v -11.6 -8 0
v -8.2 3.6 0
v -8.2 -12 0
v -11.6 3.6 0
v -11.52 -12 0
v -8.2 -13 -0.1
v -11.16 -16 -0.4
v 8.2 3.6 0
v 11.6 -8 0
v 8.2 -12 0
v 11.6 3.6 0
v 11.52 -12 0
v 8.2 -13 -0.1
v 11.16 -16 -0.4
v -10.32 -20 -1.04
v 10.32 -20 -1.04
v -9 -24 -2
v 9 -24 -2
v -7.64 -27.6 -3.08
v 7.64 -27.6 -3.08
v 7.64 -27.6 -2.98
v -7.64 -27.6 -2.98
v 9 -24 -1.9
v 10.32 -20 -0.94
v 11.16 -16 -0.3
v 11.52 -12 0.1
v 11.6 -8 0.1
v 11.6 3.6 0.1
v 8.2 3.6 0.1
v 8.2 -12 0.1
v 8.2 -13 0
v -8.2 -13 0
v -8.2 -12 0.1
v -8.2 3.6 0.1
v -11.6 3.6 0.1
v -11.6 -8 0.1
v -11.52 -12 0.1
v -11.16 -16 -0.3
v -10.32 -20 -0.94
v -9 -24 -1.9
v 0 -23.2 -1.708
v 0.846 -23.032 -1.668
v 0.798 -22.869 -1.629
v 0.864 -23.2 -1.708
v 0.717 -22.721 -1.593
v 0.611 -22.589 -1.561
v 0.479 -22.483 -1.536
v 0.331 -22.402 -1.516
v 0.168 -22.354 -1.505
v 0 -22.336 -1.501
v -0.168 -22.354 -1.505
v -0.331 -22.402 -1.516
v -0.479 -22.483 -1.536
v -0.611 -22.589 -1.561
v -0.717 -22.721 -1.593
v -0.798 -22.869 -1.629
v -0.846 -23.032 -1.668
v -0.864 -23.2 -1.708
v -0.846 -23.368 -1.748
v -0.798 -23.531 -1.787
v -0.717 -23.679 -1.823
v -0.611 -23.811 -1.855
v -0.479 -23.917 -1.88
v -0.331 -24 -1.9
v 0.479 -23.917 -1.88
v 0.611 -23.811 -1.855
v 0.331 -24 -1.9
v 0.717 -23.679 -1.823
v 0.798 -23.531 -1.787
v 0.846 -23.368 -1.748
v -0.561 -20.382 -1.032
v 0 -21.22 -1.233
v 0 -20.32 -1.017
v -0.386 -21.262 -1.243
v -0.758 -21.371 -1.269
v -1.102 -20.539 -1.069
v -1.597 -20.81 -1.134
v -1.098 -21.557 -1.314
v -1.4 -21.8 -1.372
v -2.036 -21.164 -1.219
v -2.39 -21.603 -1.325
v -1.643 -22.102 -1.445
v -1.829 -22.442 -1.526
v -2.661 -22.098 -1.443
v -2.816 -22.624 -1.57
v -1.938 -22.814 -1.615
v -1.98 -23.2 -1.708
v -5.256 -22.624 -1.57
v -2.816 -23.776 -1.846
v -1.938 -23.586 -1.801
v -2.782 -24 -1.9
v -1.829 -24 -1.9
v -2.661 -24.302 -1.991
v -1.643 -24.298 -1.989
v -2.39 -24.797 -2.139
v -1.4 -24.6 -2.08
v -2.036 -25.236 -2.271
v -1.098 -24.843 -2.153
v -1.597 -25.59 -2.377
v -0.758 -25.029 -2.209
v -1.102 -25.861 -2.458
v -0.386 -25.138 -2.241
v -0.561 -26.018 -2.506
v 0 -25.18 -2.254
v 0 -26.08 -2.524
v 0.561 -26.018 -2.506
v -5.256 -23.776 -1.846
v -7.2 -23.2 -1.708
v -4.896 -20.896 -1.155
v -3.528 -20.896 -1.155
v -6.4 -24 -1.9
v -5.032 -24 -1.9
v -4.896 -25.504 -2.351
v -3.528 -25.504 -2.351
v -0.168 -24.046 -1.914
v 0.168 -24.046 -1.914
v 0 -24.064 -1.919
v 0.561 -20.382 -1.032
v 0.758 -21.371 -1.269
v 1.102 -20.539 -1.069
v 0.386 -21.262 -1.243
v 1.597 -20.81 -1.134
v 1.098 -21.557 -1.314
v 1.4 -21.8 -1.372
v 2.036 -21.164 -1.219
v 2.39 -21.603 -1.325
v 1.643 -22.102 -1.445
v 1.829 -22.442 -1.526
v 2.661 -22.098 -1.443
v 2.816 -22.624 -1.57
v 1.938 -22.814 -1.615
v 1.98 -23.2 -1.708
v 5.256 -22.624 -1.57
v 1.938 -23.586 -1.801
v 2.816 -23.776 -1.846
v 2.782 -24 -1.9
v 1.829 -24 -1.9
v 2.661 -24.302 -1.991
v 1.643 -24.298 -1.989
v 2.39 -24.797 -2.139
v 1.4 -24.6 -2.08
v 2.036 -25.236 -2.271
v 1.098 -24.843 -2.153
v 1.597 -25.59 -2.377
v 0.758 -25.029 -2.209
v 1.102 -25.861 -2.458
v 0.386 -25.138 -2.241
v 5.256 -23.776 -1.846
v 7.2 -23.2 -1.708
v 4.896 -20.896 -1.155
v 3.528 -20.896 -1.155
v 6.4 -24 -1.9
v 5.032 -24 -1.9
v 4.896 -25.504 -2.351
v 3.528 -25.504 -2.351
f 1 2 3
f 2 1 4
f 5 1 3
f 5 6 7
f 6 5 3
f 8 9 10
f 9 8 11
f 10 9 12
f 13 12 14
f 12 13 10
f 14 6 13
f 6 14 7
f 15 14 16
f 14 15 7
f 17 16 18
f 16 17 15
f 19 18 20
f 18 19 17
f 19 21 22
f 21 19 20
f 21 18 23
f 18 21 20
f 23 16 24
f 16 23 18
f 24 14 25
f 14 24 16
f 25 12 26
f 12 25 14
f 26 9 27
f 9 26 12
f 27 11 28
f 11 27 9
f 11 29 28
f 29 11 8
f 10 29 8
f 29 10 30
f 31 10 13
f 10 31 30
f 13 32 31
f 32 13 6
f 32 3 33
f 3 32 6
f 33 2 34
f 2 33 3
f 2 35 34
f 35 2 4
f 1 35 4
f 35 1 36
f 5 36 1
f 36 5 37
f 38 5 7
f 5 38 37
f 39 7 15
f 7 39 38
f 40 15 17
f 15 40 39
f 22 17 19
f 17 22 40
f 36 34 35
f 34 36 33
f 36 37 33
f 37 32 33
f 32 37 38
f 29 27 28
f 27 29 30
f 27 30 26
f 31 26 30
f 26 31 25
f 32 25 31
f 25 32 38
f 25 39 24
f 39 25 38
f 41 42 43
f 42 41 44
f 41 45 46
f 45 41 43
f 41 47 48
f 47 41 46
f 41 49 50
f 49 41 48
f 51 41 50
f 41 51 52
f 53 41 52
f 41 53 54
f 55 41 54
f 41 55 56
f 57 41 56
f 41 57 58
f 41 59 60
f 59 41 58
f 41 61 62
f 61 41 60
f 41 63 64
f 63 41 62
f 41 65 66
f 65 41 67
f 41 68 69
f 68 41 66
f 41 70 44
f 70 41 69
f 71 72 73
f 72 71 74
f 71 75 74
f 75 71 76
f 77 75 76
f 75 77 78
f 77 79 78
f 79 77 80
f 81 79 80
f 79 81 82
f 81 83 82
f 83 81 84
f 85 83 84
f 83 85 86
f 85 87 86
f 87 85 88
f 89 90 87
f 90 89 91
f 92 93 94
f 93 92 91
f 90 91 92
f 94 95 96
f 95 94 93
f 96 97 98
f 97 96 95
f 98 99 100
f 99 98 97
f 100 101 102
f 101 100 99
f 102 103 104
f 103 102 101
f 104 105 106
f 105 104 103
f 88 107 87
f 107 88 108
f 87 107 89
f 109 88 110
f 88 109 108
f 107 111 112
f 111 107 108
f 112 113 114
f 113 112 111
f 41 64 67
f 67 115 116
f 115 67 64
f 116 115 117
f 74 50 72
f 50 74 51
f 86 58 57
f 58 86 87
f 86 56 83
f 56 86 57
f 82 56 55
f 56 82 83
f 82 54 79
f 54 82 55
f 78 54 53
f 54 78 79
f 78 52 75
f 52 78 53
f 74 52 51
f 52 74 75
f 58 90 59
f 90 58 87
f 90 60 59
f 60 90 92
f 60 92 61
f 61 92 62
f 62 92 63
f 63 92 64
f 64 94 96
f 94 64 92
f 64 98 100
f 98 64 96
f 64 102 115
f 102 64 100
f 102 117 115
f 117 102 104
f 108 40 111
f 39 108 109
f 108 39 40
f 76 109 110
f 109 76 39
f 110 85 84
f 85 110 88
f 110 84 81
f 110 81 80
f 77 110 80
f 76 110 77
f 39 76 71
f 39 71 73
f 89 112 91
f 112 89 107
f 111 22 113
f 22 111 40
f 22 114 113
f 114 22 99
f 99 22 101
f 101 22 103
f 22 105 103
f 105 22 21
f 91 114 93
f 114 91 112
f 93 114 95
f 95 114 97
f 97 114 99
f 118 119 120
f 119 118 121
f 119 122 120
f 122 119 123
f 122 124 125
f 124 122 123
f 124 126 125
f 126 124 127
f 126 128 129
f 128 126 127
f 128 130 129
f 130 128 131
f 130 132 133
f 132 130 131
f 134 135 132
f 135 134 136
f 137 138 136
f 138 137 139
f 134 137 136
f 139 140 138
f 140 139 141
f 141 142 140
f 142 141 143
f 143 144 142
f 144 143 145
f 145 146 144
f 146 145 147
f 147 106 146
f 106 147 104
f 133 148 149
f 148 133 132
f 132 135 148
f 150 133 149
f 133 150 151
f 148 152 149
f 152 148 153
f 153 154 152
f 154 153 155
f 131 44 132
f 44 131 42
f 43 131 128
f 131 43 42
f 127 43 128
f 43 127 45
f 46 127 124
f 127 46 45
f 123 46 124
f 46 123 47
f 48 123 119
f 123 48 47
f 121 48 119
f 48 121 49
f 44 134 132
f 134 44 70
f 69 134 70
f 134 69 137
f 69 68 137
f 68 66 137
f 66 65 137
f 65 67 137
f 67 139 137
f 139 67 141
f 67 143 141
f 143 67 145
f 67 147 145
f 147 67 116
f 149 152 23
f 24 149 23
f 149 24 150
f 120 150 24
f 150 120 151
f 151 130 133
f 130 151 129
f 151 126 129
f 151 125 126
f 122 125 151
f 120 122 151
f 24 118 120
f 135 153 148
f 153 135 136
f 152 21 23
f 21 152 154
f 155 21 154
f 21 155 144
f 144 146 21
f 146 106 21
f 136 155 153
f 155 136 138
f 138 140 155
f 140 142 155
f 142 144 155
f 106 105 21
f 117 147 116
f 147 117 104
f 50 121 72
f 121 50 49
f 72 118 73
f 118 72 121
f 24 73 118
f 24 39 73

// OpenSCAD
use <../lib.scad>
function ldraw_lib__4263304ec01() = [
// 0 Sticker  3.9 x  2.9 with Yellow Lego Train Logo (BNSF) on Dark Green Background (Formed)
// 0 Name: 4263304ec01.dat
// 0 Author: Gerald Lasser [GeraldLasser]
// 0 !LDRAW_ORG Part UPDATE 2025-01
// 0 !LICENSE Licensed under CC BY 4.0 : see CAreadme.txt
// 
// 0 BFC CERTIFY CCW
  [0,"BFC","CERTIFY"],
  [0,"BFC","CCW"],
// 
// 0 !KEYWORDS Bricklink 10133stk01, Brickowl 912944, Rebrickable 53049, santa fe
// 0 !KEYWORDS Set 10133
// 
// 0 !HISTORY 2025-01-20 [OrionP] Official Update 2025-01
// 
// 4 16 -29 0 9 -20.5 0 9 -20.5 0 -30 -29 0 -20
  [4,16,-29,0,9,-20.5,0,9,-20.5,0,-30,-29,0,-20],
// 3 16 -28.8 0 -30 -29 0 -20 -20.5 0 -30
  [3,16,-28.8,0,-30,-29,0,-20,-20.5,0,-30],
// 4 16 -27.9 1 -40 -28.8 0 -30 -20.5 0 -30 -20.5 .25 -32.5
  [4,16,-27.9,1,-40,-28.8,0,-30,-20.5,0,-30,-20.5,.25,-32.5],
// 4 16 20.5 0 -30 20.5 0 9 29 0 9 29 0 -20
  [4,16,20.5,0,-30,20.5,0,9,29,0,9,29,0,-20],
// 3 16 20.5 0 -30 29 0 -20 28.8 0 -30
  [3,16,20.5,0,-30,29,0,-20,28.8,0,-30],
// 4 16 20.5 0 -30 28.8 0 -30 27.9 1 -40 20.5 .25 -32.5
  [4,16,20.5,0,-30,28.8,0,-30,27.9,1,-40,20.5,.25,-32.5],
// 4 16 -27.9 1 -40 -20.5 .25 -32.5 20.5 .25 -32.5 27.9 1 -40
  [4,16,-27.9,1,-40,-20.5,.25,-32.5,20.5,.25,-32.5,27.9,1,-40],
// 4 16 -27.9 1 -40 27.9 1 -40 25.8 2.6 -50 -25.8 2.6 -50
  [4,16,-27.9,1,-40,27.9,1,-40,25.8,2.6,-50,-25.8,2.6,-50],
// 4 16 25.8 2.6 -50 22.5 5 -60 -22.5 5 -60 -25.8 2.6 -50
  [4,16,25.8,2.6,-50,22.5,5,-60,-22.5,5,-60,-25.8,2.6,-50],
// 4 16 19.1 7.7 -69 -19.1 7.7 -69 -22.5 5 -60 22.5 5 -60
  [4,16,19.1,7.7,-69,-19.1,7.7,-69,-22.5,5,-60,22.5,5,-60],
// 4 16 19.1 7.45 -69 -19.1 7.45 -69 -19.1 7.7 -69 19.1 7.7 -69
  [4,16,19.1,7.45,-69,-19.1,7.45,-69,-19.1,7.7,-69,19.1,7.7,-69],
// 4 16 22.5 4.75 -60 19.1 7.45 -69 19.1 7.7 -69 22.5 5 -60
  [4,16,22.5,4.75,-60,19.1,7.45,-69,19.1,7.7,-69,22.5,5,-60],
// 4 16 25.8 2.35 -50 22.5 4.75 -60 22.5 5 -60 25.8 2.6 -50
  [4,16,25.8,2.35,-50,22.5,4.75,-60,22.5,5,-60,25.8,2.6,-50],
// 4 16 27.9 .75 -40 25.8 2.35 -50 25.8 2.6 -50 27.9 1 -40
  [4,16,27.9,.75,-40,25.8,2.35,-50,25.8,2.6,-50,27.9,1,-40],
// 4 16 28.8 -.25 -30 27.9 .75 -40 27.9 1 -40 28.8 0 -30
  [4,16,28.8,-.25,-30,27.9,.75,-40,27.9,1,-40,28.8,0,-30],
// 4 16 29 -.25 -20 28.8 -.25 -30 28.8 0 -30 29 0 -20
  [4,16,29,-.25,-20,28.8,-.25,-30,28.8,0,-30,29,0,-20],
// 4 16 29 -.25 9 29 -.25 -20 29 0 -20 29 0 9
  [4,16,29,-.25,9,29,-.25,-20,29,0,-20,29,0,9],
// 4 16 20.5 0 9 20.5 -.25 9 29 -.25 9 29 0 9
  [4,16,20.5,0,9,20.5,-.25,9,29,-.25,9,29,0,9],
// 4 16 20.5 -.25 -30 20.5 -.25 9 20.5 0 9 20.5 0 -30
  [4,16,20.5,-.25,-30,20.5,-.25,9,20.5,0,9,20.5,0,-30],
// 4 16 20.5 0 -32.5 20.5 -.25 -30 20.5 0 -30 20.5 .25 -32.5
  [4,16,20.5,0,-32.5,20.5,-.25,-30,20.5,0,-30,20.5,.25,-32.5],
// 4 16 -20.5 0 -32.5 20.5 0 -32.5 20.5 .25 -32.5 -20.5 .25 -32.5
  [4,16,-20.5,0,-32.5,20.5,0,-32.5,20.5,.25,-32.5,-20.5,.25,-32.5],
// 4 16 -20.5 0 -30 -20.5 -.25 -30 -20.5 0 -32.5 -20.5 .25 -32.5
  [4,16,-20.5,0,-30,-20.5,-.25,-30,-20.5,0,-32.5,-20.5,.25,-32.5],
// 4 16 -20.5 -.25 9 -20.5 -.25 -30 -20.5 0 -30 -20.5 0 9
  [4,16,-20.5,-.25,9,-20.5,-.25,-30,-20.5,0,-30,-20.5,0,9],
// 4 16 -29 -.25 9 -20.5 -.25 9 -20.5 0 9 -29 0 9
  [4,16,-29,-.25,9,-20.5,-.25,9,-20.5,0,9,-29,0,9],
// 4 16 -29 -.25 -20 -29 -.25 9 -29 0 9 -29 0 -20
  [4,16,-29,-.25,-20,-29,-.25,9,-29,0,9,-29,0,-20],
// 4 16 -28.8 -.25 -30 -29 -.25 -20 -29 0 -20 -28.8 0 -30
  [4,16,-28.8,-.25,-30,-29,-.25,-20,-29,0,-20,-28.8,0,-30],
// 4 16 -27.9 .75 -40 -28.8 -.25 -30 -28.8 0 -30 -27.9 1 -40
  [4,16,-27.9,.75,-40,-28.8,-.25,-30,-28.8,0,-30,-27.9,1,-40],
// 4 16 -25.8 2.35 -50 -27.9 .75 -40 -27.9 1 -40 -25.8 2.6 -50
  [4,16,-25.8,2.35,-50,-27.9,.75,-40,-27.9,1,-40,-25.8,2.6,-50],
// 4 16 -22.5 4.75 -60 -25.8 2.35 -50 -25.8 2.6 -50 -22.5 5 -60
  [4,16,-22.5,4.75,-60,-25.8,2.35,-50,-25.8,2.6,-50,-22.5,5,-60],
// 4 16 -19.1 7.45 -69 -22.5 4.75 -60 -22.5 5 -60 -19.1 7.7 -69
  [4,16,-19.1,7.45,-69,-22.5,4.75,-60,-22.5,5,-60,-19.1,7.7,-69],
// 
// 4 288 -20.5 -.25 -30 -20.5 -.25 9 -29 -.25 9 -29 -.25 -20
  [4,288,-20.5,-.25,-30,-20.5,-.25,9,-29,-.25,9,-29,-.25,-20],
// 3 288 -29 -.25 -20 -28.8 -.25 -30 -20.5 -.25 -30
  [3,288,-29,-.25,-20,-28.8,-.25,-30,-20.5,-.25,-30],
// 4 288 -20.5 -.25 -30 -28.8 -.25 -30 -27.9 .75 -40 -20.5 0 -32.5
  [4,288,-20.5,-.25,-30,-28.8,-.25,-30,-27.9,.75,-40,-20.5,0,-32.5],
// 4 288 29 -.25 9 20.5 -.25 9 20.5 -.25 -30 29 -.25 -20
  [4,288,29,-.25,9,20.5,-.25,9,20.5,-.25,-30,29,-.25,-20],
// 3 288 29 -.25 -20 20.5 -.25 -30 28.8 -.25 -30
  [3,288,29,-.25,-20,20.5,-.25,-30,28.8,-.25,-30],
// 4 288 27.9 .75 -40 28.8 -.25 -30 20.5 -.25 -30 20.5 0 -32.5
  [4,288,27.9,.75,-40,28.8,-.25,-30,20.5,-.25,-30,20.5,0,-32.5],
// 4 288 20.5 0 -32.5 -20.5 0 -32.5 -27.9 .75 -40 27.9 .75 -40
  [4,288,20.5,0,-32.5,-20.5,0,-32.5,-27.9,.75,-40,27.9,.75,-40],
// 4 288 25.8 2.35 -50 27.9 .75 -40 -27.9 .75 -40 -25.8 2.35 -50
  [4,288,25.8,2.35,-50,27.9,.75,-40,-27.9,.75,-40,-25.8,2.35,-50],
// 4 14 0 4.27 -58 2.16 4.27 -58 2.114 4.1692 -57.58 1.99562 4.07161 -57.17337
  [4,14,0,4.27,-58,2.16,4.27,-58,2.114,4.1692,-57.58,1.99562,4.07161,-57.17337],
// 4 14 0 4.27 -58 1.99562 4.07161 -57.17337 1.792 3.98248 -56.802 1.52734 3.90344 -56.47266
  [4,14,0,4.27,-58,1.99562,4.07161,-57.17337,1.792,3.98248,-56.802,1.52734,3.90344,-56.47266],
// 4 14 0 4.27 -58 1.52734 3.90344 -56.47266 1.198 3.83992 -56.208 .82663 3.79105 -56.00438
  [4,14,0,4.27,-58,1.52734,3.90344,-56.47266,1.198,3.83992,-56.208,.82663,3.79105,-56.00438],
// 4 14 0 4.27 -58 .82663 3.79105 -56.00438 .42 3.76264 -55.886 0 3.7516 -55.84
  [4,14,0,4.27,-58,.82663,3.79105,-56.00438,.42,3.76264,-55.886,0,3.7516,-55.84],
// 4 14 0 4.27 -58 0 3.7516 -55.84 -.42 3.76264 -55.886 -.82663 3.79105 -56.00438
  [4,14,0,4.27,-58,0,3.7516,-55.84,-.42,3.76264,-55.886,-.82663,3.79105,-56.00438],
// 4 14 0 4.27 -58 -.82663 3.79105 -56.00438 -1.198 3.83992 -56.208 -1.52734 3.90344 -56.47266
  [4,14,0,4.27,-58,-.82663,3.79105,-56.00438,-1.198,3.83992,-56.208,-1.52734,3.90344,-56.47266],
// 4 14 0 4.27 -58 -1.52734 3.90344 -56.47266 -1.792 3.98248 -56.802 -1.99562 4.07161 -57.17337
  [4,14,0,4.27,-58,-1.52734,3.90344,-56.47266,-1.792,3.98248,-56.802,-1.99562,4.07161,-57.17337],
// 4 14 0 4.27 -58 -1.99562 4.07161 -57.17337 -2.114 4.1692 -57.58 -2.16 4.27 -58
  [4,14,0,4.27,-58,-1.99562,4.07161,-57.17337,-2.114,4.1692,-57.58,-2.16,4.27,-58],
// 4 14 0 4.27 -58 -2.16 4.27 -58 -2.114 4.3708 -58.42 -1.99562 4.46839 -58.82663
  [4,14,0,4.27,-58,-2.16,4.27,-58,-2.114,4.3708,-58.42,-1.99562,4.46839,-58.82663],
// 4 14 0 4.27 -58 -1.99562 4.46839 -58.82663 -1.792 4.55752 -59.198 -1.52734 4.63656 -59.52734
  [4,14,0,4.27,-58,-1.99562,4.46839,-58.82663,-1.792,4.55752,-59.198,-1.52734,4.63656,-59.52734],
// 4 14 0 4.27 -58 -1.52734 4.63656 -59.52734 -1.198 4.70008 -59.792 -.82663 4.75 -60
  [4,14,0,4.27,-58,-1.52734,4.63656,-59.52734,-1.198,4.70008,-59.792,-.82663,4.75,-60],
// 4 14 0 4.27 -58 .82663 4.75 -60 1.198 4.70008 -59.792 1.52734 4.63656 -59.52734
  [4,14,0,4.27,-58,.82663,4.75,-60,1.198,4.70008,-59.792,1.52734,4.63656,-59.52734],
// 4 14 0 4.27 -58 1.52734 4.63656 -59.52734 1.792 4.55752 -59.198 1.99562 4.46839 -58.82663
  [4,14,0,4.27,-58,1.52734,4.63656,-59.52734,1.792,4.55752,-59.198,1.99562,4.46839,-58.82663],
// 4 14 0 4.27 -58 1.99562 4.46839 -58.82663 2.114 4.3708 -58.42 2.16 4.27 -58
  [4,14,0,4.27,-58,1.99562,4.46839,-58.82663,2.114,4.3708,-58.42,2.16,4.27,-58],
// 4 14 0 2.542 -50.8 -1.402 2.57896 -50.954 -.964 3.10744 -53.156 0 3.082 -53.05
  [4,14,0,2.542,-50.8,-1.402,2.57896,-50.954,-.964,3.10744,-53.156,0,3.082,-53.05],
// 4 14 -1.402 2.57896 -50.954 -2.75544 2.6735 -51.34792 -1.89437 3.17241 -53.42669 -.964 3.10744 -53.156
  [4,14,-1.402,2.57896,-50.954,-2.75544,2.6735,-51.34792,-1.89437,3.17241,-53.42669,-.964,3.10744,-53.156],
// 4 14 -2.75544 2.6735 -51.34792 -3.992 2.83624 -52.026 -2.744 3.28432 -53.893 -1.89437 3.17241 -53.42669
  [4,14,-2.75544,2.6735,-51.34792,-3.992,2.83624,-52.026,-2.744,3.28432,-53.893,-1.89437,3.17241,-53.42669],
// 4 14 -3.992 2.83624 -52.026 -5.09112 3.04813 -52.90888 -3.50015 3.42997 -54.49985 -2.744 3.28432 -53.893
  [4,14,-3.992,2.83624,-52.026,-5.09112,3.04813,-52.90888,-3.50015,3.42997,-54.49985,-2.744,3.28432,-53.893],
// 4 14 -3.50015 3.42997 -54.49985 -5.09112 3.04813 -52.90888 -5.974 3.31192 -54.008 -4.107 3.61144 -55.256
  [4,14,-3.50015,3.42997,-54.49985,-5.09112,3.04813,-52.90888,-5.974,3.31192,-54.008,-4.107,3.61144,-55.256],
// 4 14 -5.974 3.31192 -54.008 -6.65208 3.60869 -55.24456 -4.57331 3.81535 -56.10563 -4.107 3.61144 -55.256
  [4,14,-5.974,3.31192,-54.008,-6.65208,3.60869,-55.24456,-4.57331,3.81535,-56.10563,-4.107,3.61144,-55.256],
// 4 14 -6.65208 3.60869 -55.24456 -7.03926 3.9244 -56.56 -4.844 4.03864 -57.036 -4.57331 3.81535 -56.10563
  [4,14,-6.65208,3.60869,-55.24456,-7.03926,3.9244,-56.56,-4.844,4.03864,-57.036,-4.57331,3.81535,-56.10563],
// 4 14 -4.95 4.27 -58 -4.844 4.03864 -57.036 -7.03926 3.9244 -56.56 -13.14 3.9244 -56.56
  [4,14,-4.95,4.27,-58,-4.844,4.03864,-57.036,-7.03926,3.9244,-56.56,-13.14,3.9244,-56.56],
// 4 14 -4.844 4.50136 -58.964 -4.95 4.27 -58 -7.03926 4.6156 -59.44 -6.95448 4.75 -60
  [4,14,-4.844,4.50136,-58.964,-4.95,4.27,-58,-7.03926,4.6156,-59.44,-6.95448,4.75,-60],
// 4 14 -4.57331 4.75 -60 -6.95448 4.75 -60 -6.65208 4.97663 -60.75544 -4.107 4.9732 -60.744
  [4,14,-4.57331,4.75,-60,-6.95448,4.75,-60,-6.65208,4.97663,-60.75544,-4.107,4.9732,-60.744],
// 3 14 -4.844 4.50136 -58.964 -6.95448 4.75 -60 -4.57331 4.75 -60
  [3,14,-4.844,4.50136,-58.964,-6.95448,4.75,-60,-4.57331,4.75,-60],
// 4 14 -4.107 4.9732 -60.744 -6.65208 4.97663 -60.75544 -5.974 5.3476 -61.992 -3.50014 5.20004 -61.50015
  [4,14,-4.107,4.9732,-60.744,-6.65208,4.97663,-60.75544,-5.974,5.3476,-61.992,-3.50014,5.20004,-61.50015],
// 4 14 -3.50014 5.20004 -61.50015 -5.974 5.3476 -61.992 -5.09112 5.67734 -63.09112 -2.744 5.3821 -62.107
  [4,14,-3.50014,5.20004,-61.50015,-5.974,5.3476,-61.992,-5.09112,5.67734,-63.09112,-2.744,5.3821,-62.107],
// 4 14 -2.744 5.3821 -62.107 -5.09112 5.67734 -63.09112 -3.992 5.9422 -63.974 -1.89436 5.52199 -62.57331
  [4,14,-2.744,5.3821,-62.107,-5.09112,5.67734,-63.09112,-3.992,5.9422,-63.974,-1.89436,5.52199,-62.57331],
// 4 14 -1.89436 5.52199 -62.57331 -3.992 5.9422 -63.974 -2.75544 6.14562 -64.65208 -.964 5.6032 -62.844
  [4,14,-1.89436,5.52199,-62.57331,-3.992,5.9422,-63.974,-2.75544,6.14562,-64.65208,-.964,5.6032,-62.844],
// 4 14 -.964 5.6032 -62.844 -2.75544 6.14562 -64.65208 -1.402 6.2638 -65.046 0 5.635 -62.95
  [4,14,-.964,5.6032,-62.844,-2.75544,6.14562,-64.65208,-1.402,6.2638,-65.046,0,5.635,-62.95],
// 4 14 0 5.635 -62.95 -1.402 6.2638 -65.046 0 6.31 -65.2 1.402 6.2638 -65.046
  [4,14,0,5.635,-62.95,-1.402,6.2638,-65.046,0,6.31,-65.2,1.402,6.2638,-65.046],
// 4 14 -4.95 4.27 -58 -13.14 3.9244 -56.56 -18 4.27 -58 -13.14 4.6156 -59.44
  [4,14,-4.95,4.27,-58,-13.14,3.9244,-56.56,-18,4.27,-58,-13.14,4.6156,-59.44],
// 3 14 -4.95 4.27 -58 -13.14 4.6156 -59.44 -7.03926 4.6156 -59.44
  [3,14,-4.95,4.27,-58,-13.14,4.6156,-59.44,-7.03926,4.6156,-59.44],
// 4 14 -13.14 3.9244 -56.56 -8.82 2.8876 -52.24 -12.24 2.8876 -52.24 -18 4.27 -58
  [4,14,-13.14,3.9244,-56.56,-8.82,2.8876,-52.24,-12.24,2.8876,-52.24,-18,4.27,-58],
// 4 14 -16 4.75 -60 -12.58 4.75 -60 -13.14 4.6156 -59.44 -18 4.27 -58
  [4,14,-16,4.75,-60,-12.58,4.75,-60,-13.14,4.6156,-59.44,-18,4.27,-58],
// 4 14 -16 4.75 -60 -12.24 5.878 -63.76 -8.82 5.878 -63.76 -12.58 4.75 -60
  [4,14,-16,4.75,-60,-12.24,5.878,-63.76,-8.82,5.878,-63.76,-12.58,4.75,-60],
// 3 14 0 4.27 -58 -.82663 4.75 -60 .82663 4.75 -60
  [3,14,0,4.27,-58,-.82663,4.75,-60,.82663,4.75,-60],
// 4 14 -.82663 4.75 -60 -.42 4.7842 -60.114 .42 4.7842 -60.114 .82663 4.75 -60
  [4,14,-.82663,4.75,-60,-.42,4.7842,-60.114,.42,4.7842,-60.114,.82663,4.75,-60],
// 3 14 .42 4.7842 -60.114 -.42 4.7842 -60.114 0 4.798 -60.16
  [3,14,.42,4.7842,-60.114,-.42,4.7842,-60.114,0,4.798,-60.16],
// 4 288 -.964 3.10744 -53.156 -.42 3.76264 -55.886 0 3.7516 -55.84 0 3.082 -53.05
  [4,288,-.964,3.10744,-53.156,-.42,3.76264,-55.886,0,3.7516,-55.84,0,3.082,-53.05],
// 4 288 -4.844 4.03864 -57.036 -4.95 4.27 -58 -2.16 4.27 -58 -2.114 4.1692 -57.58
  [4,288,-4.844,4.03864,-57.036,-4.95,4.27,-58,-2.16,4.27,-58,-2.114,4.1692,-57.58],
// 4 288 -4.57331 3.81535 -56.10563 -4.844 4.03864 -57.036 -2.114 4.1692 -57.58 -1.99562 4.07161 -57.17337
  [4,288,-4.57331,3.81535,-56.10563,-4.844,4.03864,-57.036,-2.114,4.1692,-57.58,-1.99562,4.07161,-57.17337],
// 4 288 -4.107 3.61144 -55.256 -4.57331 3.81535 -56.10563 -1.99562 4.07161 -57.17337 -1.792 3.98248 -56.802
  [4,288,-4.107,3.61144,-55.256,-4.57331,3.81535,-56.10563,-1.99562,4.07161,-57.17337,-1.792,3.98248,-56.802],
// 4 288 -3.50015 3.42997 -54.49985 -4.107 3.61144 -55.256 -1.792 3.98248 -56.802 -1.52734 3.90344 -56.47266
  [4,288,-3.50015,3.42997,-54.49985,-4.107,3.61144,-55.256,-1.792,3.98248,-56.802,-1.52734,3.90344,-56.47266],
// 4 288 -2.744 3.28432 -53.893 -3.50015 3.42997 -54.49985 -1.52734 3.90344 -56.47266 -1.198 3.83992 -56.208
  [4,288,-2.744,3.28432,-53.893,-3.50015,3.42997,-54.49985,-1.52734,3.90344,-56.47266,-1.198,3.83992,-56.208],
// 4 288 -1.89437 3.17241 -53.42669 -2.744 3.28432 -53.893 -1.198 3.83992 -56.208 -.82663 3.79105 -56.00438
  [4,288,-1.89437,3.17241,-53.42669,-2.744,3.28432,-53.893,-1.198,3.83992,-56.208,-.82663,3.79105,-56.00438],
// 4 288 -.964 3.10744 -53.156 -1.89437 3.17241 -53.42669 -.82663 3.79105 -56.00438 -.42 3.76264 -55.886
  [4,288,-.964,3.10744,-53.156,-1.89437,3.17241,-53.42669,-.82663,3.79105,-56.00438,-.42,3.76264,-55.886],
// 4 288 -4.95 4.27 -58 -4.844 4.50136 -58.964 -2.114 4.3708 -58.42 -2.16 4.27 -58
  [4,288,-4.95,4.27,-58,-4.844,4.50136,-58.964,-2.114,4.3708,-58.42,-2.16,4.27,-58],
// 4 288 -2.114 4.3708 -58.42 -4.844 4.50136 -58.964 -4.57331 4.75 -60 -1.99562 4.46839 -58.82663
  [4,288,-2.114,4.3708,-58.42,-4.844,4.50136,-58.964,-4.57331,4.75,-60,-1.99562,4.46839,-58.82663],
// 3 288 -1.99562 4.46839 -58.82663 -4.57331 4.75 -60 -1.792 4.55752 -59.198
  [3,288,-1.99562,4.46839,-58.82663,-4.57331,4.75,-60,-1.792,4.55752,-59.198],
// 3 288 -1.792 4.55752 -59.198 -4.57331 4.75 -60 -1.52734 4.63656 -59.52734
  [3,288,-1.792,4.55752,-59.198,-4.57331,4.75,-60,-1.52734,4.63656,-59.52734],
// 3 288 -1.52734 4.63656 -59.52734 -4.57331 4.75 -60 -1.198 4.70008 -59.792
  [3,288,-1.52734,4.63656,-59.52734,-4.57331,4.75,-60,-1.198,4.70008,-59.792],
// 3 288 -1.198 4.70008 -59.792 -4.57331 4.75 -60 -.82663 4.75 -60
  [3,288,-1.198,4.70008,-59.792,-4.57331,4.75,-60,-.82663,4.75,-60],
// 4 288 -.82663 4.75 -60 -4.57331 4.75 -60 -4.107 4.9732 -60.744 -3.50014 5.20004 -61.50015
  [4,288,-.82663,4.75,-60,-4.57331,4.75,-60,-4.107,4.9732,-60.744,-3.50014,5.20004,-61.50015],
// 4 288 -.82663 4.75 -60 -3.50014 5.20004 -61.50015 -2.744 5.3821 -62.107 -1.89436 5.52199 -62.57331
  [4,288,-.82663,4.75,-60,-3.50014,5.20004,-61.50015,-2.744,5.3821,-62.107,-1.89436,5.52199,-62.57331],
// 4 288 -.42 4.7842 -60.114 -.82663 4.75 -60 -1.89436 5.52199 -62.57331 -.964 5.6032 -62.844
  [4,288,-.42,4.7842,-60.114,-.82663,4.75,-60,-1.89436,5.52199,-62.57331,-.964,5.6032,-62.844],
// 4 288 -.42 4.7842 -60.114 -.964 5.6032 -62.844 0 5.635 -62.95 0 4.798 -60.16
  [4,288,-.42,4.7842,-60.114,-.964,5.6032,-62.844,0,5.635,-62.95,0,4.798,-60.16],
// 3 288 -18 4.27 -58 -22.5 4.75 -60 -16 4.75 -60
  [3,288,-18,4.27,-58,-22.5,4.75,-60,-16,4.75,-60],
// 4 288 -25.8 2.35 -50 -22.5 4.75 -60 -18 4.27 -58 -12.24 2.8876 -52.24
  [4,288,-25.8,2.35,-50,-22.5,4.75,-60,-18,4.27,-58,-12.24,2.8876,-52.24],
// 4 288 -25.8 2.35 -50 -12.24 2.8876 -52.24 -8.82 2.8876 -52.24 -2.75544 2.6735 -51.34792
  [4,288,-25.8,2.35,-50,-12.24,2.8876,-52.24,-8.82,2.8876,-52.24,-2.75544,2.6735,-51.34792],
// 4 288 -13.14 3.9244 -56.56 -7.03926 3.9244 -56.56 -6.65208 3.60869 -55.24456 -8.82 2.8876 -52.24
  [4,288,-13.14,3.9244,-56.56,-7.03926,3.9244,-56.56,-6.65208,3.60869,-55.24456,-8.82,2.8876,-52.24],
// 3 288 -8.82 2.8876 -52.24 -6.65208 3.60869 -55.24456 -5.974 3.31192 -54.008
  [3,288,-8.82,2.8876,-52.24,-6.65208,3.60869,-55.24456,-5.974,3.31192,-54.008],
// 3 288 -8.82 2.8876 -52.24 -5.974 3.31192 -54.008 -5.09112 3.04813 -52.90888
  [3,288,-8.82,2.8876,-52.24,-5.974,3.31192,-54.008,-5.09112,3.04813,-52.90888],
// 3 288 -3.992 2.83624 -52.026 -8.82 2.8876 -52.24 -5.09112 3.04813 -52.90888
  [3,288,-3.992,2.83624,-52.026,-8.82,2.8876,-52.24,-5.09112,3.04813,-52.90888],
// 3 288 -2.75544 2.6735 -51.34792 -8.82 2.8876 -52.24 -3.992 2.83624 -52.026
  [3,288,-2.75544,2.6735,-51.34792,-8.82,2.8876,-52.24,-3.992,2.83624,-52.026],
// 3 288 -25.8 2.35 -50 -2.75544 2.6735 -51.34792 -1.402 2.57896 -50.954
  [3,288,-25.8,2.35,-50,-2.75544,2.6735,-51.34792,-1.402,2.57896,-50.954],
// 3 288 -25.8 2.35 -50 -1.402 2.57896 -50.954 0 2.542 -50.8
  [3,288,-25.8,2.35,-50,-1.402,2.57896,-50.954,0,2.542,-50.8],
// 4 288 -13.14 4.6156 -59.44 -12.58 4.75 -60 -6.95448 4.75 -60 -7.03926 4.6156 -59.44
  [4,288,-13.14,4.6156,-59.44,-12.58,4.75,-60,-6.95448,4.75,-60,-7.03926,4.6156,-59.44],
// 4 288 -16 4.75 -60 -22.5 4.75 -60 -19.1 7.45 -69 -12.24 5.878 -63.76
  [4,288,-16,4.75,-60,-22.5,4.75,-60,-19.1,7.45,-69,-12.24,5.878,-63.76],
// 4 288 -8.82 5.878 -63.76 -12.24 5.878 -63.76 -19.1 7.45 -69 -3.992 5.9422 -63.974
  [4,288,-8.82,5.878,-63.76,-12.24,5.878,-63.76,-19.1,7.45,-69,-3.992,5.9422,-63.974],
// 3 288 -3.992 5.9422 -63.974 -19.1 7.45 -69 -2.75544 6.14562 -64.65208
  [3,288,-3.992,5.9422,-63.974,-19.1,7.45,-69,-2.75544,6.14562,-64.65208],
// 3 288 -2.75544 6.14562 -64.65208 -19.1 7.45 -69 -1.402 6.2638 -65.046
  [3,288,-2.75544,6.14562,-64.65208,-19.1,7.45,-69,-1.402,6.2638,-65.046],
// 4 288 0 6.31 -65.2 -1.402 6.2638 -65.046 -19.1 7.45 -69 19.1 7.45 -69
  [4,288,0,6.31,-65.2,-1.402,6.2638,-65.046,-19.1,7.45,-69,19.1,7.45,-69],
// 4 288 -6.65208 4.97663 -60.75544 -6.95448 4.75 -60 -12.58 4.75 -60 -8.82 5.878 -63.76
  [4,288,-6.65208,4.97663,-60.75544,-6.95448,4.75,-60,-12.58,4.75,-60,-8.82,5.878,-63.76],
// 3 288 -6.65208 4.97663 -60.75544 -8.82 5.878 -63.76 -5.974 5.3476 -61.992
  [3,288,-6.65208,4.97663,-60.75544,-8.82,5.878,-63.76,-5.974,5.3476,-61.992],
// 3 288 -5.974 5.3476 -61.992 -8.82 5.878 -63.76 -5.09112 5.67734 -63.09112
  [3,288,-5.974,5.3476,-61.992,-8.82,5.878,-63.76,-5.09112,5.67734,-63.09112],
// 3 288 -5.09112 5.67734 -63.09112 -8.82 5.878 -63.76 -3.992 5.9422 -63.974
  [3,288,-5.09112,5.67734,-63.09112,-8.82,5.878,-63.76,-3.992,5.9422,-63.974],
// 4 14 1.89436 3.17241 -53.42669 2.75544 2.6735 -51.34792 1.402 2.57896 -50.954 .964 3.10744 -53.156
  [4,14,1.89436,3.17241,-53.42669,2.75544,2.6735,-51.34792,1.402,2.57896,-50.954,.964,3.10744,-53.156],
// 4 14 2.744 3.28432 -53.893 3.992 2.83624 -52.026 2.75544 2.6735 -51.34792 1.89436 3.17241 -53.42669
  [4,14,2.744,3.28432,-53.893,3.992,2.83624,-52.026,2.75544,2.6735,-51.34792,1.89436,3.17241,-53.42669],
// 4 14 3.50014 3.42997 -54.49985 5.09112 3.04813 -52.90888 3.992 2.83624 -52.026 2.744 3.28432 -53.893
  [4,14,3.50014,3.42997,-54.49985,5.09112,3.04813,-52.90888,3.992,2.83624,-52.026,2.744,3.28432,-53.893],
// 4 14 5.974 3.31192 -54.008 5.09112 3.04813 -52.90888 3.50014 3.42997 -54.49985 4.107 3.61144 -55.256
  [4,14,5.974,3.31192,-54.008,5.09112,3.04813,-52.90888,3.50014,3.42997,-54.49985,4.107,3.61144,-55.256],
// 4 14 4.5733 3.81535 -56.10563 6.65208 3.60869 -55.24456 5.974 3.31192 -54.008 4.107 3.61144 -55.256
  [4,14,4.5733,3.81535,-56.10563,6.65208,3.60869,-55.24456,5.974,3.31192,-54.008,4.107,3.61144,-55.256],
// 4 14 4.844 4.03864 -57.036 7.03926 3.9244 -56.56 6.65208 3.60869 -55.24456 4.5733 3.81535 -56.10563
  [4,14,4.844,4.03864,-57.036,7.03926,3.9244,-56.56,6.65208,3.60869,-55.24456,4.5733,3.81535,-56.10563],
// 4 14 7.03926 3.9244 -56.56 4.844 4.03864 -57.036 4.95 4.27 -58 13.14 3.9244 -56.56
  [4,14,7.03926,3.9244,-56.56,4.844,4.03864,-57.036,4.95,4.27,-58,13.14,3.9244,-56.56],
// 4 14 7.03926 4.6156 -59.44 4.95 4.27 -58 4.844 4.50136 -58.964 6.95448 4.75 -60
  [4,14,7.03926,4.6156,-59.44,4.95,4.27,-58,4.844,4.50136,-58.964,6.95448,4.75,-60],
// 4 14 6.65208 4.97663 -60.75544 6.95448 4.75 -60 4.57331 4.75 -60 4.107 4.9732 -60.744
  [4,14,6.65208,4.97663,-60.75544,6.95448,4.75,-60,4.57331,4.75,-60,4.107,4.9732,-60.744],
// 3 14 4.844 4.50136 -58.964 4.57331 4.75 -60 6.95448 4.75 -60
  [3,14,4.844,4.50136,-58.964,4.57331,4.75,-60,6.95448,4.75,-60],
// 4 14 5.974 5.3476 -61.992 6.65208 4.97663 -60.75544 4.107 4.9732 -60.744 3.50015 5.20004 -61.50015
  [4,14,5.974,5.3476,-61.992,6.65208,4.97663,-60.75544,4.107,4.9732,-60.744,3.50015,5.20004,-61.50015],
// 4 14 5.09112 5.67734 -63.09112 5.974 5.3476 -61.992 3.50015 5.20004 -61.50015 2.744 5.3821 -62.107
  [4,14,5.09112,5.67734,-63.09112,5.974,5.3476,-61.992,3.50015,5.20004,-61.50015,2.744,5.3821,-62.107],
// 4 14 3.992 5.9422 -63.974 5.09112 5.67734 -63.09112 2.744 5.3821 -62.107 1.89437 5.52199 -62.57331
  [4,14,3.992,5.9422,-63.974,5.09112,5.67734,-63.09112,2.744,5.3821,-62.107,1.89437,5.52199,-62.57331],
// 4 14 2.75544 6.14562 -64.65208 3.992 5.9422 -63.974 1.89437 5.52199 -62.57331 .964 5.6032 -62.844
  [4,14,2.75544,6.14562,-64.65208,3.992,5.9422,-63.974,1.89437,5.52199,-62.57331,.964,5.6032,-62.844],
// 4 14 1.402 6.2638 -65.046 2.75544 6.14562 -64.65208 .964 5.6032 -62.844 0 5.635 -62.95
  [4,14,1.402,6.2638,-65.046,2.75544,6.14562,-64.65208,.964,5.6032,-62.844,0,5.635,-62.95],
// 4 14 18 4.27 -58 13.14 3.9244 -56.56 4.95 4.27 -58 13.14 4.6156 -59.44
  [4,14,18,4.27,-58,13.14,3.9244,-56.56,4.95,4.27,-58,13.14,4.6156,-59.44],
// 3 14 4.95 4.27 -58 7.03926 4.6156 -59.44 13.14 4.6156 -59.44
  [3,14,4.95,4.27,-58,7.03926,4.6156,-59.44,13.14,4.6156,-59.44],
// 4 14 12.24 2.8876 -52.24 8.82 2.8876 -52.24 13.14 3.9244 -56.56 18 4.27 -58
  [4,14,12.24,2.8876,-52.24,8.82,2.8876,-52.24,13.14,3.9244,-56.56,18,4.27,-58],
// 4 14 13.14 4.6156 -59.44 12.58 4.75 -60 16 4.75 -60 18 4.27 -58
  [4,14,13.14,4.6156,-59.44,12.58,4.75,-60,16,4.75,-60,18,4.27,-58],
// 4 14 8.82 5.878 -63.76 12.24 5.878 -63.76 16 4.75 -60 12.58 4.75 -60
  [4,14,8.82,5.878,-63.76,12.24,5.878,-63.76,16,4.75,-60,12.58,4.75,-60],
// 4 288 2.16 4.27 -58 4.95 4.27 -58 4.844 4.03864 -57.036 2.114 4.1692 -57.58
  [4,288,2.16,4.27,-58,4.95,4.27,-58,4.844,4.03864,-57.036,2.114,4.1692,-57.58],
// 4 288 2.114 4.1692 -57.58 4.844 4.03864 -57.036 4.5733 3.81535 -56.10563 1.99562 4.07161 -57.17337
  [4,288,2.114,4.1692,-57.58,4.844,4.03864,-57.036,4.5733,3.81535,-56.10563,1.99562,4.07161,-57.17337],
// 4 288 1.99562 4.07161 -57.17337 4.5733 3.81535 -56.10563 4.107 3.61144 -55.256 1.792 3.98248 -56.802
  [4,288,1.99562,4.07161,-57.17337,4.5733,3.81535,-56.10563,4.107,3.61144,-55.256,1.792,3.98248,-56.802],
// 4 288 1.792 3.98248 -56.802 4.107 3.61144 -55.256 3.50014 3.42997 -54.49985 1.52734 3.90344 -56.47266
  [4,288,1.792,3.98248,-56.802,4.107,3.61144,-55.256,3.50014,3.42997,-54.49985,1.52734,3.90344,-56.47266],
// 4 288 1.52734 3.90344 -56.47266 3.50014 3.42997 -54.49985 2.744 3.28432 -53.893 1.198 3.83992 -56.208
  [4,288,1.52734,3.90344,-56.47266,3.50014,3.42997,-54.49985,2.744,3.28432,-53.893,1.198,3.83992,-56.208],
// 4 288 1.198 3.83992 -56.208 2.744 3.28432 -53.893 1.89436 3.17241 -53.42669 .82663 3.79105 -56.00438
  [4,288,1.198,3.83992,-56.208,2.744,3.28432,-53.893,1.89436,3.17241,-53.42669,.82663,3.79105,-56.00438],
// 4 288 .82663 3.79105 -56.00438 1.89436 3.17241 -53.42669 .964 3.10744 -53.156 .42 3.76264 -55.886
  [4,288,.82663,3.79105,-56.00438,1.89436,3.17241,-53.42669,.964,3.10744,-53.156,.42,3.76264,-55.886],
// 4 288 2.114 4.3708 -58.42 4.844 4.50136 -58.964 4.95 4.27 -58 2.16 4.27 -58
  [4,288,2.114,4.3708,-58.42,4.844,4.50136,-58.964,4.95,4.27,-58,2.16,4.27,-58],
// 4 288 4.57331 4.75 -60 4.844 4.50136 -58.964 2.114 4.3708 -58.42 1.99562 4.46839 -58.82663
  [4,288,4.57331,4.75,-60,4.844,4.50136,-58.964,2.114,4.3708,-58.42,1.99562,4.46839,-58.82663],
// 3 288 1.99562 4.46839 -58.82663 1.792 4.55752 -59.198 4.57331 4.75 -60
  [3,288,1.99562,4.46839,-58.82663,1.792,4.55752,-59.198,4.57331,4.75,-60],
// 3 288 1.792 4.55752 -59.198 1.52734 4.63656 -59.52734 4.57331 4.75 -60
  [3,288,1.792,4.55752,-59.198,1.52734,4.63656,-59.52734,4.57331,4.75,-60],
// 3 288 1.52734 4.63656 -59.52734 1.198 4.70008 -59.792 4.57331 4.75 -60
  [3,288,1.52734,4.63656,-59.52734,1.198,4.70008,-59.792,4.57331,4.75,-60],
// 3 288 1.198 4.70008 -59.792 .82663 4.75 -60 4.57331 4.75 -60
  [3,288,1.198,4.70008,-59.792,.82663,4.75,-60,4.57331,4.75,-60],
// 4 288 4.107 4.9732 -60.744 4.57331 4.75 -60 .82663 4.75 -60 3.50015 5.20004 -61.50015
  [4,288,4.107,4.9732,-60.744,4.57331,4.75,-60,.82663,4.75,-60,3.50015,5.20004,-61.50015],
// 4 288 2.744 5.3821 -62.107 3.50015 5.20004 -61.50015 .82663 4.75 -60 1.89437 5.52199 -62.57331
  [4,288,2.744,5.3821,-62.107,3.50015,5.20004,-61.50015,.82663,4.75,-60,1.89437,5.52199,-62.57331],
// 4 288 1.89437 5.52199 -62.57331 .82663 4.75 -60 .42 4.7842 -60.114 .964 5.6032 -62.844
  [4,288,1.89437,5.52199,-62.57331,.82663,4.75,-60,.42,4.7842,-60.114,.964,5.6032,-62.844],
// 3 288 18 4.27 -58 16 4.75 -60 22.5 4.75 -60
  [3,288,18,4.27,-58,16,4.75,-60,22.5,4.75,-60],
// 4 288 18 4.27 -58 22.5 4.75 -60 25.8 2.35 -50 12.24 2.8876 -52.24
  [4,288,18,4.27,-58,22.5,4.75,-60,25.8,2.35,-50,12.24,2.8876,-52.24],
// 4 288 8.82 2.8876 -52.24 12.24 2.8876 -52.24 25.8 2.35 -50 2.75544 2.6735 -51.34792
  [4,288,8.82,2.8876,-52.24,12.24,2.8876,-52.24,25.8,2.35,-50,2.75544,2.6735,-51.34792],
// 4 288 6.65208 3.60869 -55.24456 7.03926 3.9244 -56.56 13.14 3.9244 -56.56 8.82 2.8876 -52.24
  [4,288,6.65208,3.60869,-55.24456,7.03926,3.9244,-56.56,13.14,3.9244,-56.56,8.82,2.8876,-52.24],
// 3 288 8.82 2.8876 -52.24 5.974 3.31192 -54.008 6.65208 3.60869 -55.24456
  [3,288,8.82,2.8876,-52.24,5.974,3.31192,-54.008,6.65208,3.60869,-55.24456],
// 3 288 8.82 2.8876 -52.24 5.09112 3.04813 -52.90888 5.974 3.31192 -54.008
  [3,288,8.82,2.8876,-52.24,5.09112,3.04813,-52.90888,5.974,3.31192,-54.008],
// 3 288 3.992 2.83624 -52.026 5.09112 3.04813 -52.90888 8.82 2.8876 -52.24
  [3,288,3.992,2.83624,-52.026,5.09112,3.04813,-52.90888,8.82,2.8876,-52.24],
// 3 288 2.75544 2.6735 -51.34792 3.992 2.83624 -52.026 8.82 2.8876 -52.24
  [3,288,2.75544,2.6735,-51.34792,3.992,2.83624,-52.026,8.82,2.8876,-52.24],
// 3 288 25.8 2.35 -50 1.402 2.57896 -50.954 2.75544 2.6735 -51.34792
  [3,288,25.8,2.35,-50,1.402,2.57896,-50.954,2.75544,2.6735,-51.34792],
// 4 288 6.95448 4.75 -60 12.58 4.75 -60 13.14 4.6156 -59.44 7.03926 4.6156 -59.44
  [4,288,6.95448,4.75,-60,12.58,4.75,-60,13.14,4.6156,-59.44,7.03926,4.6156,-59.44],
// 4 288 19.1 7.45 -69 22.5 4.75 -60 16 4.75 -60 12.24 5.878 -63.76
  [4,288,19.1,7.45,-69,22.5,4.75,-60,16,4.75,-60,12.24,5.878,-63.76],
// 4 288 19.1 7.45 -69 12.24 5.878 -63.76 8.82 5.878 -63.76 3.992 5.9422 -63.974
  [4,288,19.1,7.45,-69,12.24,5.878,-63.76,8.82,5.878,-63.76,3.992,5.9422,-63.974],
// 3 288 3.992 5.9422 -63.974 2.75544 6.14562 -64.65208 19.1 7.45 -69
  [3,288,3.992,5.9422,-63.974,2.75544,6.14562,-64.65208,19.1,7.45,-69],
// 3 288 2.75544 6.14562 -64.65208 1.402 6.2638 -65.046 19.1 7.45 -69
  [3,288,2.75544,6.14562,-64.65208,1.402,6.2638,-65.046,19.1,7.45,-69],
// 4 288 12.58 4.75 -60 6.95448 4.75 -60 6.65208 4.97663 -60.75544 8.82 5.878 -63.76
  [4,288,12.58,4.75,-60,6.95448,4.75,-60,6.65208,4.97663,-60.75544,8.82,5.878,-63.76],
// 3 288 6.65208 4.97663 -60.75544 5.974 5.3476 -61.992 8.82 5.878 -63.76
  [3,288,6.65208,4.97663,-60.75544,5.974,5.3476,-61.992,8.82,5.878,-63.76],
// 3 288 5.974 5.3476 -61.992 5.09112 5.67734 -63.09112 8.82 5.878 -63.76
  [3,288,5.974,5.3476,-61.992,5.09112,5.67734,-63.09112,8.82,5.878,-63.76],
// 3 288 5.09112 5.67734 -63.09112 3.992 5.9422 -63.974 8.82 5.878 -63.76
  [3,288,5.09112,5.67734,-63.09112,3.992,5.9422,-63.974,8.82,5.878,-63.76],
// 3 288 1.402 6.2638 -65.046 0 6.31 -65.2 19.1 7.45 -69
  [3,288,1.402,6.2638,-65.046,0,6.31,-65.2,19.1,7.45,-69],
// 4 288 0 5.635 -62.95 .964 5.6032 -62.844 .42 4.7842 -60.114 0 4.798 -60.16
  [4,288,0,5.635,-62.95,.964,5.6032,-62.844,.42,4.7842,-60.114,0,4.798,-60.16],
// 4 288 0 3.7516 -55.84 .42 3.76264 -55.886 .964 3.10744 -53.156 0 3.082 -53.05
  [4,288,0,3.7516,-55.84,.42,3.76264,-55.886,.964,3.10744,-53.156,0,3.082,-53.05],
// 4 14 0 2.542 -50.8 0 3.082 -53.05 .964 3.10744 -53.156 1.402 2.57896 -50.954
  [4,14,0,2.542,-50.8,0,3.082,-53.05,.964,3.10744,-53.156,1.402,2.57896,-50.954],
// 3 288 25.8 2.35 -50 0 2.542 -50.8 1.402 2.57896 -50.954
  [3,288,25.8,2.35,-50,0,2.542,-50.8,1.402,2.57896,-50.954],
// 3 288 25.8 2.35 -50 -25.8 2.35 -50 0 2.542 -50.8
  [3,288,25.8,2.35,-50,-25.8,2.35,-50,0,2.542,-50.8],
// 
// 5 24 -28.8 -.25 -30 -20.5 -.25 -30 -27.9 .75 -40 -29 -.25 9
  [5,24,-28.8,-.25,-30,-20.5,-.25,-30,-27.9,.75,-40,-29,-.25,9],
// 5 24 28.8 -.25 -30 20.5 -.25 -30 20.5 0 -32.5 20.5 -.25 9
  [5,24,28.8,-.25,-30,20.5,-.25,-30,20.5,0,-32.5,20.5,-.25,9],
// 5 24 27.9 .75 -40 -27.9 .75 -40 -25.8 2.35 -50 -28.8 -.25 -30
  [5,24,27.9,.75,-40,-27.9,.75,-40,-25.8,2.35,-50,-28.8,-.25,-30],
// 5 24 25.8 2.35 -50 -25.8 2.35 -50 -27.9 .75 -40 -22.5 4.75 -60
  [5,24,25.8,2.35,-50,-25.8,2.35,-50,-27.9,.75,-40,-22.5,4.75,-60],
// 5 24 22.5 4.75 -60 -22.5 4.75 -60 25.8 2.35 -50 19.1 7.45 -69
  [5,24,22.5,4.75,-60,-22.5,4.75,-60,25.8,2.35,-50,19.1,7.45,-69],
// 5 24 27.9 .75 -40 27.9 1 -40 28.8 -.25 -30 25.8 2.35 -50
  [5,24,27.9,.75,-40,27.9,1,-40,28.8,-.25,-30,25.8,2.35,-50],
// 5 24 25.8 2.35 -50 25.8 2.6 -50 27.9 .75 -40 22.5 4.75 -60
  [5,24,25.8,2.35,-50,25.8,2.6,-50,27.9,.75,-40,22.5,4.75,-60],
// 5 24 22.5 4.75 -60 22.5 5 -60 25.8 2.35 -50 19.1 7.45 -69
  [5,24,22.5,4.75,-60,22.5,5,-60,25.8,2.35,-50,19.1,7.45,-69],
// 5 24 28.8 -.25 -30 28.8 0 -30 27.9 1 -40 29 0 -20
  [5,24,28.8,-.25,-30,28.8,0,-30,27.9,1,-40,29,0,-20],
// 5 24 -28.8 -.25 -30 -28.8 0 -30 -29 -.25 -20 -27.9 .75 -40
  [5,24,-28.8,-.25,-30,-28.8,0,-30,-29,-.25,-20,-27.9,.75,-40],
// 5 24 -27.9 .75 -40 -27.9 1 -40 -28.8 -.25 -30 -25.8 2.35 -50
  [5,24,-27.9,.75,-40,-27.9,1,-40,-28.8,-.25,-30,-25.8,2.35,-50],
// 5 24 -25.8 2.35 -50 -25.8 2.6 -50 -27.9 .75 -40 -22.5 4.75 -60
  [5,24,-25.8,2.35,-50,-25.8,2.6,-50,-27.9,.75,-40,-22.5,4.75,-60],
// 5 24 -22.5 4.75 -60 -22.5 5 -60 -25.8 2.35 -50 -19.1 7.45 -69
  [5,24,-22.5,4.75,-60,-22.5,5,-60,-25.8,2.35,-50,-19.1,7.45,-69],
];
module ldraw_lib__4263304ec01(step=0, col=false, unit=2/5, alt=false, line=0.2, solid=!$preview)
    makepoly(ldraw_lib__4263304ec01(), step=step, col=col, unit=unit, alt=alt, line=line, solid=solid);
ldraw_lib__4263304ec01(line=0.2);
